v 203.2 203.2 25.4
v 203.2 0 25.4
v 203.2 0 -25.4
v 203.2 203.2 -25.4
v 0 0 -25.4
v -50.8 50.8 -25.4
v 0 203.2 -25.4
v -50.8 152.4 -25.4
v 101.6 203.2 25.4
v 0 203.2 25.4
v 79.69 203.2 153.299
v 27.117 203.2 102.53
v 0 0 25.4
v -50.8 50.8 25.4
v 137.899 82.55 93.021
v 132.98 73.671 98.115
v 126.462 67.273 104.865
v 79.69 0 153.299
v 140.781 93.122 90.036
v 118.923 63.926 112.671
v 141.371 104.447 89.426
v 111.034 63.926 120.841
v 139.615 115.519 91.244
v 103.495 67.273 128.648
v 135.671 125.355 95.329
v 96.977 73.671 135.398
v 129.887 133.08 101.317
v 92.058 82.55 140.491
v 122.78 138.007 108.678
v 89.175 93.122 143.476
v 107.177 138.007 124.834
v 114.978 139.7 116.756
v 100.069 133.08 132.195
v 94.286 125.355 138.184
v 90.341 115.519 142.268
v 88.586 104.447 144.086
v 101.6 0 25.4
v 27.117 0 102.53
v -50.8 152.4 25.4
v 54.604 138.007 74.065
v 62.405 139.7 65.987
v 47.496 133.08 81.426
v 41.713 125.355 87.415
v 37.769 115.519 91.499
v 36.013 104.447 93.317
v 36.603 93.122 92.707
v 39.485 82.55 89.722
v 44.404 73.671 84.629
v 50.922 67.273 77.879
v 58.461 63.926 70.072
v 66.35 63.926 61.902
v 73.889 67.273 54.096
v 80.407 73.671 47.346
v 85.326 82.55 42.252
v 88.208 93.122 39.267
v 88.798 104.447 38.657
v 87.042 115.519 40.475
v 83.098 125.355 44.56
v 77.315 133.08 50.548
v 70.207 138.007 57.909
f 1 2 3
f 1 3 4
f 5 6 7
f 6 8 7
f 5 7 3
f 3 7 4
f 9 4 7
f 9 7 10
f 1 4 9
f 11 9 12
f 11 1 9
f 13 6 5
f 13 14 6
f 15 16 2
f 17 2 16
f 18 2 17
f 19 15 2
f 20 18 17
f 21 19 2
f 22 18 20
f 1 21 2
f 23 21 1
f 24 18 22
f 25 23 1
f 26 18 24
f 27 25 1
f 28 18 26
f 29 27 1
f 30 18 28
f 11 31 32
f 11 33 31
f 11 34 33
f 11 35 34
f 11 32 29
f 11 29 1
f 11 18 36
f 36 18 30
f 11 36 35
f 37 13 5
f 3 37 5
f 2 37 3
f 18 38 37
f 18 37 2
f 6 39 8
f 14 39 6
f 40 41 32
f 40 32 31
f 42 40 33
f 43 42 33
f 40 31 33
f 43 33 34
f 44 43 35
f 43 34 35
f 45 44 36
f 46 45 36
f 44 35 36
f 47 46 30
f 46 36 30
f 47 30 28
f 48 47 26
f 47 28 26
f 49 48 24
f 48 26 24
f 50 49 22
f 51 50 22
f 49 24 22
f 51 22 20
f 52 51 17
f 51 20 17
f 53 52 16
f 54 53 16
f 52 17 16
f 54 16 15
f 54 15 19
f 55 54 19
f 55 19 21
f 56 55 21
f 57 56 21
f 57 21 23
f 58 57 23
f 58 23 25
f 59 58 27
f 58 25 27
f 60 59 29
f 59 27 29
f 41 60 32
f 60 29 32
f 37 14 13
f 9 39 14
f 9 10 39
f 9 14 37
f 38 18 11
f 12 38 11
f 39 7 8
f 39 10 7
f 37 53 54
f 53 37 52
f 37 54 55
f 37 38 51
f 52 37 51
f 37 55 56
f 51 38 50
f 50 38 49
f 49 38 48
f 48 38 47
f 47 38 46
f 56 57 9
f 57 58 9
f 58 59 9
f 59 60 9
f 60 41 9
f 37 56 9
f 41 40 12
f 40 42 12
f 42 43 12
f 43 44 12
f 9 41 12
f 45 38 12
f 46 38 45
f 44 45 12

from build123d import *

# Parameters (mm, degrees)
F1_DEPTH = 25.4
F3_W     = 203.2
F3_H     = 177.8
F3_R     = 38.1
F5_DEPTH = 73.084924


with BuildPart() as f1:
    # F0 (on Top) → F1 (new body, symmetric)
    with BuildSketch(Plane.XY):
        Polygon((-50.8, 50.8), (0, 0), (203.2, 0), (203.2, 203.2), (0, 203.2), (-50.8, 152.4), align=None)
    extrude(amount=F1_DEPTH, both=True)

    # F3 (on face) → F5 (join, through all)
    with BuildSketch(Plane(origin=(117.838052, 0, 113.794884), x_dir=(0, 1, 0), z_dir=(0.71934, 0, 0.694658))):
        with Locations((101.6, -33.98335)):
            Rectangle(F3_W, F3_H)
        with Locations((101.6, 4.11665)):
            Circle(F3_R, mode=Mode.SUBTRACT)
    extrude(amount=-F5_DEPTH)


solid = f1.part
